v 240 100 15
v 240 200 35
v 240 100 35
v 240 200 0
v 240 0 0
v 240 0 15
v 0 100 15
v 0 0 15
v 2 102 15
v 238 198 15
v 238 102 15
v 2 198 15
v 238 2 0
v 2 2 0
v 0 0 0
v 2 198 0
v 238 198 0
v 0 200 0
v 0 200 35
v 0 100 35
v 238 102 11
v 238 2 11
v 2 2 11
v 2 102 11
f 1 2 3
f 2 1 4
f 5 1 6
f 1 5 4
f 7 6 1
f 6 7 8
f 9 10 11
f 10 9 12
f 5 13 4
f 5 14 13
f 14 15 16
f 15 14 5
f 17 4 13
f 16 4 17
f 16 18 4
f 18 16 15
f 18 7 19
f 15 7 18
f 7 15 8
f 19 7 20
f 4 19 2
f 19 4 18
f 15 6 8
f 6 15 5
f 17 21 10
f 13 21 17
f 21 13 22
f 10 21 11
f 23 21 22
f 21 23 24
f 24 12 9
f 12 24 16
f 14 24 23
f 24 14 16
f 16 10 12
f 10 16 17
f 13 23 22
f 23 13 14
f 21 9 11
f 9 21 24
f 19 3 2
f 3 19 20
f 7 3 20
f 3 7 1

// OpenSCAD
// file: mounts.scad
//mount four pads
echo("LOADING MOUNTS FILE");

eps = 0.01;


module mount4_pads(distX, distY, padD, padH, z0=0) {
    translate([0,      0,      z0]) cylinder(padH, d = padD, center = false);
    translate([distX,  0,      z0]) cylinder(padH, d = padD, center = false);
    translate([0,      distY,  z0]) cylinder(padH, d = padD, center = false);
    translate([distX,  distY,  z0]) cylinder(padH, d = padD, center = false);
}

// Bohrungen (negativer Raum)
module mount4_holes(distX, distY, holeD, depth, z0=0) {
    h = depth + 2*eps;
    translate([0,      0,      z0 - eps]) cylinder(h, d = holeD, center = false);
    translate([distX,  0,      z0 - eps]) cylinder(h, d = holeD, center = false);
    translate([0,      distY,  z0 - eps]) cylinder(h, d = holeD, center = false);
    translate([distX,  distY,  z0 - eps]) cylinder(h, d = holeD, center = false);
}
// file: usvMount.scad
echo("USING PI MOUNT FILE");
use <./mounts.scad>;
usv_mountDistX    = 58;
usv_mountDistY    = 48;
usv_mountHeight   = 5;
usv_mountD        = 4;

module usv_mounts(
    distX = usv_mountDistX,
    distY = usv_mountDistY,
    h     = usv_mountHeight,
    d     = usv_mountD
) {
    mount4_holes(distX, distY, d, h, 0);
}
// file: piMount.scad
echo("USING PI MOUNT FILE");
use <./mounts.scad>;
pi_mountDistX    = 58;
pi_mountDistY    = 48;
pi_mountHeight   = 5;
pi_mountD        = 4;

module pi_mounts(
    distX = pi_mountDistX,
    distY = pi_mountDistY,
    h     = pi_mountHeight,
    d     = pi_mountD
) {
    mount4_holes(distX, distY, d, h, 0);
}
// main file
// bottomcase
use <./piMount.scad>;
use <./usvMount.scad>;


thickness=2;

module top(){
difference(){
translate([0,100,15])
cube([240,100,20]);



}
difference(){

cube([240,200,15]);
translate([thickness,thickness,-2*thickness])
cube([240-(2*thickness),200-(2*thickness),15]);
translate([thickness,100 + thickness,-2*thickness])
cube([240-(2*thickness),100-(2*thickness),40]);
}

}

top();
